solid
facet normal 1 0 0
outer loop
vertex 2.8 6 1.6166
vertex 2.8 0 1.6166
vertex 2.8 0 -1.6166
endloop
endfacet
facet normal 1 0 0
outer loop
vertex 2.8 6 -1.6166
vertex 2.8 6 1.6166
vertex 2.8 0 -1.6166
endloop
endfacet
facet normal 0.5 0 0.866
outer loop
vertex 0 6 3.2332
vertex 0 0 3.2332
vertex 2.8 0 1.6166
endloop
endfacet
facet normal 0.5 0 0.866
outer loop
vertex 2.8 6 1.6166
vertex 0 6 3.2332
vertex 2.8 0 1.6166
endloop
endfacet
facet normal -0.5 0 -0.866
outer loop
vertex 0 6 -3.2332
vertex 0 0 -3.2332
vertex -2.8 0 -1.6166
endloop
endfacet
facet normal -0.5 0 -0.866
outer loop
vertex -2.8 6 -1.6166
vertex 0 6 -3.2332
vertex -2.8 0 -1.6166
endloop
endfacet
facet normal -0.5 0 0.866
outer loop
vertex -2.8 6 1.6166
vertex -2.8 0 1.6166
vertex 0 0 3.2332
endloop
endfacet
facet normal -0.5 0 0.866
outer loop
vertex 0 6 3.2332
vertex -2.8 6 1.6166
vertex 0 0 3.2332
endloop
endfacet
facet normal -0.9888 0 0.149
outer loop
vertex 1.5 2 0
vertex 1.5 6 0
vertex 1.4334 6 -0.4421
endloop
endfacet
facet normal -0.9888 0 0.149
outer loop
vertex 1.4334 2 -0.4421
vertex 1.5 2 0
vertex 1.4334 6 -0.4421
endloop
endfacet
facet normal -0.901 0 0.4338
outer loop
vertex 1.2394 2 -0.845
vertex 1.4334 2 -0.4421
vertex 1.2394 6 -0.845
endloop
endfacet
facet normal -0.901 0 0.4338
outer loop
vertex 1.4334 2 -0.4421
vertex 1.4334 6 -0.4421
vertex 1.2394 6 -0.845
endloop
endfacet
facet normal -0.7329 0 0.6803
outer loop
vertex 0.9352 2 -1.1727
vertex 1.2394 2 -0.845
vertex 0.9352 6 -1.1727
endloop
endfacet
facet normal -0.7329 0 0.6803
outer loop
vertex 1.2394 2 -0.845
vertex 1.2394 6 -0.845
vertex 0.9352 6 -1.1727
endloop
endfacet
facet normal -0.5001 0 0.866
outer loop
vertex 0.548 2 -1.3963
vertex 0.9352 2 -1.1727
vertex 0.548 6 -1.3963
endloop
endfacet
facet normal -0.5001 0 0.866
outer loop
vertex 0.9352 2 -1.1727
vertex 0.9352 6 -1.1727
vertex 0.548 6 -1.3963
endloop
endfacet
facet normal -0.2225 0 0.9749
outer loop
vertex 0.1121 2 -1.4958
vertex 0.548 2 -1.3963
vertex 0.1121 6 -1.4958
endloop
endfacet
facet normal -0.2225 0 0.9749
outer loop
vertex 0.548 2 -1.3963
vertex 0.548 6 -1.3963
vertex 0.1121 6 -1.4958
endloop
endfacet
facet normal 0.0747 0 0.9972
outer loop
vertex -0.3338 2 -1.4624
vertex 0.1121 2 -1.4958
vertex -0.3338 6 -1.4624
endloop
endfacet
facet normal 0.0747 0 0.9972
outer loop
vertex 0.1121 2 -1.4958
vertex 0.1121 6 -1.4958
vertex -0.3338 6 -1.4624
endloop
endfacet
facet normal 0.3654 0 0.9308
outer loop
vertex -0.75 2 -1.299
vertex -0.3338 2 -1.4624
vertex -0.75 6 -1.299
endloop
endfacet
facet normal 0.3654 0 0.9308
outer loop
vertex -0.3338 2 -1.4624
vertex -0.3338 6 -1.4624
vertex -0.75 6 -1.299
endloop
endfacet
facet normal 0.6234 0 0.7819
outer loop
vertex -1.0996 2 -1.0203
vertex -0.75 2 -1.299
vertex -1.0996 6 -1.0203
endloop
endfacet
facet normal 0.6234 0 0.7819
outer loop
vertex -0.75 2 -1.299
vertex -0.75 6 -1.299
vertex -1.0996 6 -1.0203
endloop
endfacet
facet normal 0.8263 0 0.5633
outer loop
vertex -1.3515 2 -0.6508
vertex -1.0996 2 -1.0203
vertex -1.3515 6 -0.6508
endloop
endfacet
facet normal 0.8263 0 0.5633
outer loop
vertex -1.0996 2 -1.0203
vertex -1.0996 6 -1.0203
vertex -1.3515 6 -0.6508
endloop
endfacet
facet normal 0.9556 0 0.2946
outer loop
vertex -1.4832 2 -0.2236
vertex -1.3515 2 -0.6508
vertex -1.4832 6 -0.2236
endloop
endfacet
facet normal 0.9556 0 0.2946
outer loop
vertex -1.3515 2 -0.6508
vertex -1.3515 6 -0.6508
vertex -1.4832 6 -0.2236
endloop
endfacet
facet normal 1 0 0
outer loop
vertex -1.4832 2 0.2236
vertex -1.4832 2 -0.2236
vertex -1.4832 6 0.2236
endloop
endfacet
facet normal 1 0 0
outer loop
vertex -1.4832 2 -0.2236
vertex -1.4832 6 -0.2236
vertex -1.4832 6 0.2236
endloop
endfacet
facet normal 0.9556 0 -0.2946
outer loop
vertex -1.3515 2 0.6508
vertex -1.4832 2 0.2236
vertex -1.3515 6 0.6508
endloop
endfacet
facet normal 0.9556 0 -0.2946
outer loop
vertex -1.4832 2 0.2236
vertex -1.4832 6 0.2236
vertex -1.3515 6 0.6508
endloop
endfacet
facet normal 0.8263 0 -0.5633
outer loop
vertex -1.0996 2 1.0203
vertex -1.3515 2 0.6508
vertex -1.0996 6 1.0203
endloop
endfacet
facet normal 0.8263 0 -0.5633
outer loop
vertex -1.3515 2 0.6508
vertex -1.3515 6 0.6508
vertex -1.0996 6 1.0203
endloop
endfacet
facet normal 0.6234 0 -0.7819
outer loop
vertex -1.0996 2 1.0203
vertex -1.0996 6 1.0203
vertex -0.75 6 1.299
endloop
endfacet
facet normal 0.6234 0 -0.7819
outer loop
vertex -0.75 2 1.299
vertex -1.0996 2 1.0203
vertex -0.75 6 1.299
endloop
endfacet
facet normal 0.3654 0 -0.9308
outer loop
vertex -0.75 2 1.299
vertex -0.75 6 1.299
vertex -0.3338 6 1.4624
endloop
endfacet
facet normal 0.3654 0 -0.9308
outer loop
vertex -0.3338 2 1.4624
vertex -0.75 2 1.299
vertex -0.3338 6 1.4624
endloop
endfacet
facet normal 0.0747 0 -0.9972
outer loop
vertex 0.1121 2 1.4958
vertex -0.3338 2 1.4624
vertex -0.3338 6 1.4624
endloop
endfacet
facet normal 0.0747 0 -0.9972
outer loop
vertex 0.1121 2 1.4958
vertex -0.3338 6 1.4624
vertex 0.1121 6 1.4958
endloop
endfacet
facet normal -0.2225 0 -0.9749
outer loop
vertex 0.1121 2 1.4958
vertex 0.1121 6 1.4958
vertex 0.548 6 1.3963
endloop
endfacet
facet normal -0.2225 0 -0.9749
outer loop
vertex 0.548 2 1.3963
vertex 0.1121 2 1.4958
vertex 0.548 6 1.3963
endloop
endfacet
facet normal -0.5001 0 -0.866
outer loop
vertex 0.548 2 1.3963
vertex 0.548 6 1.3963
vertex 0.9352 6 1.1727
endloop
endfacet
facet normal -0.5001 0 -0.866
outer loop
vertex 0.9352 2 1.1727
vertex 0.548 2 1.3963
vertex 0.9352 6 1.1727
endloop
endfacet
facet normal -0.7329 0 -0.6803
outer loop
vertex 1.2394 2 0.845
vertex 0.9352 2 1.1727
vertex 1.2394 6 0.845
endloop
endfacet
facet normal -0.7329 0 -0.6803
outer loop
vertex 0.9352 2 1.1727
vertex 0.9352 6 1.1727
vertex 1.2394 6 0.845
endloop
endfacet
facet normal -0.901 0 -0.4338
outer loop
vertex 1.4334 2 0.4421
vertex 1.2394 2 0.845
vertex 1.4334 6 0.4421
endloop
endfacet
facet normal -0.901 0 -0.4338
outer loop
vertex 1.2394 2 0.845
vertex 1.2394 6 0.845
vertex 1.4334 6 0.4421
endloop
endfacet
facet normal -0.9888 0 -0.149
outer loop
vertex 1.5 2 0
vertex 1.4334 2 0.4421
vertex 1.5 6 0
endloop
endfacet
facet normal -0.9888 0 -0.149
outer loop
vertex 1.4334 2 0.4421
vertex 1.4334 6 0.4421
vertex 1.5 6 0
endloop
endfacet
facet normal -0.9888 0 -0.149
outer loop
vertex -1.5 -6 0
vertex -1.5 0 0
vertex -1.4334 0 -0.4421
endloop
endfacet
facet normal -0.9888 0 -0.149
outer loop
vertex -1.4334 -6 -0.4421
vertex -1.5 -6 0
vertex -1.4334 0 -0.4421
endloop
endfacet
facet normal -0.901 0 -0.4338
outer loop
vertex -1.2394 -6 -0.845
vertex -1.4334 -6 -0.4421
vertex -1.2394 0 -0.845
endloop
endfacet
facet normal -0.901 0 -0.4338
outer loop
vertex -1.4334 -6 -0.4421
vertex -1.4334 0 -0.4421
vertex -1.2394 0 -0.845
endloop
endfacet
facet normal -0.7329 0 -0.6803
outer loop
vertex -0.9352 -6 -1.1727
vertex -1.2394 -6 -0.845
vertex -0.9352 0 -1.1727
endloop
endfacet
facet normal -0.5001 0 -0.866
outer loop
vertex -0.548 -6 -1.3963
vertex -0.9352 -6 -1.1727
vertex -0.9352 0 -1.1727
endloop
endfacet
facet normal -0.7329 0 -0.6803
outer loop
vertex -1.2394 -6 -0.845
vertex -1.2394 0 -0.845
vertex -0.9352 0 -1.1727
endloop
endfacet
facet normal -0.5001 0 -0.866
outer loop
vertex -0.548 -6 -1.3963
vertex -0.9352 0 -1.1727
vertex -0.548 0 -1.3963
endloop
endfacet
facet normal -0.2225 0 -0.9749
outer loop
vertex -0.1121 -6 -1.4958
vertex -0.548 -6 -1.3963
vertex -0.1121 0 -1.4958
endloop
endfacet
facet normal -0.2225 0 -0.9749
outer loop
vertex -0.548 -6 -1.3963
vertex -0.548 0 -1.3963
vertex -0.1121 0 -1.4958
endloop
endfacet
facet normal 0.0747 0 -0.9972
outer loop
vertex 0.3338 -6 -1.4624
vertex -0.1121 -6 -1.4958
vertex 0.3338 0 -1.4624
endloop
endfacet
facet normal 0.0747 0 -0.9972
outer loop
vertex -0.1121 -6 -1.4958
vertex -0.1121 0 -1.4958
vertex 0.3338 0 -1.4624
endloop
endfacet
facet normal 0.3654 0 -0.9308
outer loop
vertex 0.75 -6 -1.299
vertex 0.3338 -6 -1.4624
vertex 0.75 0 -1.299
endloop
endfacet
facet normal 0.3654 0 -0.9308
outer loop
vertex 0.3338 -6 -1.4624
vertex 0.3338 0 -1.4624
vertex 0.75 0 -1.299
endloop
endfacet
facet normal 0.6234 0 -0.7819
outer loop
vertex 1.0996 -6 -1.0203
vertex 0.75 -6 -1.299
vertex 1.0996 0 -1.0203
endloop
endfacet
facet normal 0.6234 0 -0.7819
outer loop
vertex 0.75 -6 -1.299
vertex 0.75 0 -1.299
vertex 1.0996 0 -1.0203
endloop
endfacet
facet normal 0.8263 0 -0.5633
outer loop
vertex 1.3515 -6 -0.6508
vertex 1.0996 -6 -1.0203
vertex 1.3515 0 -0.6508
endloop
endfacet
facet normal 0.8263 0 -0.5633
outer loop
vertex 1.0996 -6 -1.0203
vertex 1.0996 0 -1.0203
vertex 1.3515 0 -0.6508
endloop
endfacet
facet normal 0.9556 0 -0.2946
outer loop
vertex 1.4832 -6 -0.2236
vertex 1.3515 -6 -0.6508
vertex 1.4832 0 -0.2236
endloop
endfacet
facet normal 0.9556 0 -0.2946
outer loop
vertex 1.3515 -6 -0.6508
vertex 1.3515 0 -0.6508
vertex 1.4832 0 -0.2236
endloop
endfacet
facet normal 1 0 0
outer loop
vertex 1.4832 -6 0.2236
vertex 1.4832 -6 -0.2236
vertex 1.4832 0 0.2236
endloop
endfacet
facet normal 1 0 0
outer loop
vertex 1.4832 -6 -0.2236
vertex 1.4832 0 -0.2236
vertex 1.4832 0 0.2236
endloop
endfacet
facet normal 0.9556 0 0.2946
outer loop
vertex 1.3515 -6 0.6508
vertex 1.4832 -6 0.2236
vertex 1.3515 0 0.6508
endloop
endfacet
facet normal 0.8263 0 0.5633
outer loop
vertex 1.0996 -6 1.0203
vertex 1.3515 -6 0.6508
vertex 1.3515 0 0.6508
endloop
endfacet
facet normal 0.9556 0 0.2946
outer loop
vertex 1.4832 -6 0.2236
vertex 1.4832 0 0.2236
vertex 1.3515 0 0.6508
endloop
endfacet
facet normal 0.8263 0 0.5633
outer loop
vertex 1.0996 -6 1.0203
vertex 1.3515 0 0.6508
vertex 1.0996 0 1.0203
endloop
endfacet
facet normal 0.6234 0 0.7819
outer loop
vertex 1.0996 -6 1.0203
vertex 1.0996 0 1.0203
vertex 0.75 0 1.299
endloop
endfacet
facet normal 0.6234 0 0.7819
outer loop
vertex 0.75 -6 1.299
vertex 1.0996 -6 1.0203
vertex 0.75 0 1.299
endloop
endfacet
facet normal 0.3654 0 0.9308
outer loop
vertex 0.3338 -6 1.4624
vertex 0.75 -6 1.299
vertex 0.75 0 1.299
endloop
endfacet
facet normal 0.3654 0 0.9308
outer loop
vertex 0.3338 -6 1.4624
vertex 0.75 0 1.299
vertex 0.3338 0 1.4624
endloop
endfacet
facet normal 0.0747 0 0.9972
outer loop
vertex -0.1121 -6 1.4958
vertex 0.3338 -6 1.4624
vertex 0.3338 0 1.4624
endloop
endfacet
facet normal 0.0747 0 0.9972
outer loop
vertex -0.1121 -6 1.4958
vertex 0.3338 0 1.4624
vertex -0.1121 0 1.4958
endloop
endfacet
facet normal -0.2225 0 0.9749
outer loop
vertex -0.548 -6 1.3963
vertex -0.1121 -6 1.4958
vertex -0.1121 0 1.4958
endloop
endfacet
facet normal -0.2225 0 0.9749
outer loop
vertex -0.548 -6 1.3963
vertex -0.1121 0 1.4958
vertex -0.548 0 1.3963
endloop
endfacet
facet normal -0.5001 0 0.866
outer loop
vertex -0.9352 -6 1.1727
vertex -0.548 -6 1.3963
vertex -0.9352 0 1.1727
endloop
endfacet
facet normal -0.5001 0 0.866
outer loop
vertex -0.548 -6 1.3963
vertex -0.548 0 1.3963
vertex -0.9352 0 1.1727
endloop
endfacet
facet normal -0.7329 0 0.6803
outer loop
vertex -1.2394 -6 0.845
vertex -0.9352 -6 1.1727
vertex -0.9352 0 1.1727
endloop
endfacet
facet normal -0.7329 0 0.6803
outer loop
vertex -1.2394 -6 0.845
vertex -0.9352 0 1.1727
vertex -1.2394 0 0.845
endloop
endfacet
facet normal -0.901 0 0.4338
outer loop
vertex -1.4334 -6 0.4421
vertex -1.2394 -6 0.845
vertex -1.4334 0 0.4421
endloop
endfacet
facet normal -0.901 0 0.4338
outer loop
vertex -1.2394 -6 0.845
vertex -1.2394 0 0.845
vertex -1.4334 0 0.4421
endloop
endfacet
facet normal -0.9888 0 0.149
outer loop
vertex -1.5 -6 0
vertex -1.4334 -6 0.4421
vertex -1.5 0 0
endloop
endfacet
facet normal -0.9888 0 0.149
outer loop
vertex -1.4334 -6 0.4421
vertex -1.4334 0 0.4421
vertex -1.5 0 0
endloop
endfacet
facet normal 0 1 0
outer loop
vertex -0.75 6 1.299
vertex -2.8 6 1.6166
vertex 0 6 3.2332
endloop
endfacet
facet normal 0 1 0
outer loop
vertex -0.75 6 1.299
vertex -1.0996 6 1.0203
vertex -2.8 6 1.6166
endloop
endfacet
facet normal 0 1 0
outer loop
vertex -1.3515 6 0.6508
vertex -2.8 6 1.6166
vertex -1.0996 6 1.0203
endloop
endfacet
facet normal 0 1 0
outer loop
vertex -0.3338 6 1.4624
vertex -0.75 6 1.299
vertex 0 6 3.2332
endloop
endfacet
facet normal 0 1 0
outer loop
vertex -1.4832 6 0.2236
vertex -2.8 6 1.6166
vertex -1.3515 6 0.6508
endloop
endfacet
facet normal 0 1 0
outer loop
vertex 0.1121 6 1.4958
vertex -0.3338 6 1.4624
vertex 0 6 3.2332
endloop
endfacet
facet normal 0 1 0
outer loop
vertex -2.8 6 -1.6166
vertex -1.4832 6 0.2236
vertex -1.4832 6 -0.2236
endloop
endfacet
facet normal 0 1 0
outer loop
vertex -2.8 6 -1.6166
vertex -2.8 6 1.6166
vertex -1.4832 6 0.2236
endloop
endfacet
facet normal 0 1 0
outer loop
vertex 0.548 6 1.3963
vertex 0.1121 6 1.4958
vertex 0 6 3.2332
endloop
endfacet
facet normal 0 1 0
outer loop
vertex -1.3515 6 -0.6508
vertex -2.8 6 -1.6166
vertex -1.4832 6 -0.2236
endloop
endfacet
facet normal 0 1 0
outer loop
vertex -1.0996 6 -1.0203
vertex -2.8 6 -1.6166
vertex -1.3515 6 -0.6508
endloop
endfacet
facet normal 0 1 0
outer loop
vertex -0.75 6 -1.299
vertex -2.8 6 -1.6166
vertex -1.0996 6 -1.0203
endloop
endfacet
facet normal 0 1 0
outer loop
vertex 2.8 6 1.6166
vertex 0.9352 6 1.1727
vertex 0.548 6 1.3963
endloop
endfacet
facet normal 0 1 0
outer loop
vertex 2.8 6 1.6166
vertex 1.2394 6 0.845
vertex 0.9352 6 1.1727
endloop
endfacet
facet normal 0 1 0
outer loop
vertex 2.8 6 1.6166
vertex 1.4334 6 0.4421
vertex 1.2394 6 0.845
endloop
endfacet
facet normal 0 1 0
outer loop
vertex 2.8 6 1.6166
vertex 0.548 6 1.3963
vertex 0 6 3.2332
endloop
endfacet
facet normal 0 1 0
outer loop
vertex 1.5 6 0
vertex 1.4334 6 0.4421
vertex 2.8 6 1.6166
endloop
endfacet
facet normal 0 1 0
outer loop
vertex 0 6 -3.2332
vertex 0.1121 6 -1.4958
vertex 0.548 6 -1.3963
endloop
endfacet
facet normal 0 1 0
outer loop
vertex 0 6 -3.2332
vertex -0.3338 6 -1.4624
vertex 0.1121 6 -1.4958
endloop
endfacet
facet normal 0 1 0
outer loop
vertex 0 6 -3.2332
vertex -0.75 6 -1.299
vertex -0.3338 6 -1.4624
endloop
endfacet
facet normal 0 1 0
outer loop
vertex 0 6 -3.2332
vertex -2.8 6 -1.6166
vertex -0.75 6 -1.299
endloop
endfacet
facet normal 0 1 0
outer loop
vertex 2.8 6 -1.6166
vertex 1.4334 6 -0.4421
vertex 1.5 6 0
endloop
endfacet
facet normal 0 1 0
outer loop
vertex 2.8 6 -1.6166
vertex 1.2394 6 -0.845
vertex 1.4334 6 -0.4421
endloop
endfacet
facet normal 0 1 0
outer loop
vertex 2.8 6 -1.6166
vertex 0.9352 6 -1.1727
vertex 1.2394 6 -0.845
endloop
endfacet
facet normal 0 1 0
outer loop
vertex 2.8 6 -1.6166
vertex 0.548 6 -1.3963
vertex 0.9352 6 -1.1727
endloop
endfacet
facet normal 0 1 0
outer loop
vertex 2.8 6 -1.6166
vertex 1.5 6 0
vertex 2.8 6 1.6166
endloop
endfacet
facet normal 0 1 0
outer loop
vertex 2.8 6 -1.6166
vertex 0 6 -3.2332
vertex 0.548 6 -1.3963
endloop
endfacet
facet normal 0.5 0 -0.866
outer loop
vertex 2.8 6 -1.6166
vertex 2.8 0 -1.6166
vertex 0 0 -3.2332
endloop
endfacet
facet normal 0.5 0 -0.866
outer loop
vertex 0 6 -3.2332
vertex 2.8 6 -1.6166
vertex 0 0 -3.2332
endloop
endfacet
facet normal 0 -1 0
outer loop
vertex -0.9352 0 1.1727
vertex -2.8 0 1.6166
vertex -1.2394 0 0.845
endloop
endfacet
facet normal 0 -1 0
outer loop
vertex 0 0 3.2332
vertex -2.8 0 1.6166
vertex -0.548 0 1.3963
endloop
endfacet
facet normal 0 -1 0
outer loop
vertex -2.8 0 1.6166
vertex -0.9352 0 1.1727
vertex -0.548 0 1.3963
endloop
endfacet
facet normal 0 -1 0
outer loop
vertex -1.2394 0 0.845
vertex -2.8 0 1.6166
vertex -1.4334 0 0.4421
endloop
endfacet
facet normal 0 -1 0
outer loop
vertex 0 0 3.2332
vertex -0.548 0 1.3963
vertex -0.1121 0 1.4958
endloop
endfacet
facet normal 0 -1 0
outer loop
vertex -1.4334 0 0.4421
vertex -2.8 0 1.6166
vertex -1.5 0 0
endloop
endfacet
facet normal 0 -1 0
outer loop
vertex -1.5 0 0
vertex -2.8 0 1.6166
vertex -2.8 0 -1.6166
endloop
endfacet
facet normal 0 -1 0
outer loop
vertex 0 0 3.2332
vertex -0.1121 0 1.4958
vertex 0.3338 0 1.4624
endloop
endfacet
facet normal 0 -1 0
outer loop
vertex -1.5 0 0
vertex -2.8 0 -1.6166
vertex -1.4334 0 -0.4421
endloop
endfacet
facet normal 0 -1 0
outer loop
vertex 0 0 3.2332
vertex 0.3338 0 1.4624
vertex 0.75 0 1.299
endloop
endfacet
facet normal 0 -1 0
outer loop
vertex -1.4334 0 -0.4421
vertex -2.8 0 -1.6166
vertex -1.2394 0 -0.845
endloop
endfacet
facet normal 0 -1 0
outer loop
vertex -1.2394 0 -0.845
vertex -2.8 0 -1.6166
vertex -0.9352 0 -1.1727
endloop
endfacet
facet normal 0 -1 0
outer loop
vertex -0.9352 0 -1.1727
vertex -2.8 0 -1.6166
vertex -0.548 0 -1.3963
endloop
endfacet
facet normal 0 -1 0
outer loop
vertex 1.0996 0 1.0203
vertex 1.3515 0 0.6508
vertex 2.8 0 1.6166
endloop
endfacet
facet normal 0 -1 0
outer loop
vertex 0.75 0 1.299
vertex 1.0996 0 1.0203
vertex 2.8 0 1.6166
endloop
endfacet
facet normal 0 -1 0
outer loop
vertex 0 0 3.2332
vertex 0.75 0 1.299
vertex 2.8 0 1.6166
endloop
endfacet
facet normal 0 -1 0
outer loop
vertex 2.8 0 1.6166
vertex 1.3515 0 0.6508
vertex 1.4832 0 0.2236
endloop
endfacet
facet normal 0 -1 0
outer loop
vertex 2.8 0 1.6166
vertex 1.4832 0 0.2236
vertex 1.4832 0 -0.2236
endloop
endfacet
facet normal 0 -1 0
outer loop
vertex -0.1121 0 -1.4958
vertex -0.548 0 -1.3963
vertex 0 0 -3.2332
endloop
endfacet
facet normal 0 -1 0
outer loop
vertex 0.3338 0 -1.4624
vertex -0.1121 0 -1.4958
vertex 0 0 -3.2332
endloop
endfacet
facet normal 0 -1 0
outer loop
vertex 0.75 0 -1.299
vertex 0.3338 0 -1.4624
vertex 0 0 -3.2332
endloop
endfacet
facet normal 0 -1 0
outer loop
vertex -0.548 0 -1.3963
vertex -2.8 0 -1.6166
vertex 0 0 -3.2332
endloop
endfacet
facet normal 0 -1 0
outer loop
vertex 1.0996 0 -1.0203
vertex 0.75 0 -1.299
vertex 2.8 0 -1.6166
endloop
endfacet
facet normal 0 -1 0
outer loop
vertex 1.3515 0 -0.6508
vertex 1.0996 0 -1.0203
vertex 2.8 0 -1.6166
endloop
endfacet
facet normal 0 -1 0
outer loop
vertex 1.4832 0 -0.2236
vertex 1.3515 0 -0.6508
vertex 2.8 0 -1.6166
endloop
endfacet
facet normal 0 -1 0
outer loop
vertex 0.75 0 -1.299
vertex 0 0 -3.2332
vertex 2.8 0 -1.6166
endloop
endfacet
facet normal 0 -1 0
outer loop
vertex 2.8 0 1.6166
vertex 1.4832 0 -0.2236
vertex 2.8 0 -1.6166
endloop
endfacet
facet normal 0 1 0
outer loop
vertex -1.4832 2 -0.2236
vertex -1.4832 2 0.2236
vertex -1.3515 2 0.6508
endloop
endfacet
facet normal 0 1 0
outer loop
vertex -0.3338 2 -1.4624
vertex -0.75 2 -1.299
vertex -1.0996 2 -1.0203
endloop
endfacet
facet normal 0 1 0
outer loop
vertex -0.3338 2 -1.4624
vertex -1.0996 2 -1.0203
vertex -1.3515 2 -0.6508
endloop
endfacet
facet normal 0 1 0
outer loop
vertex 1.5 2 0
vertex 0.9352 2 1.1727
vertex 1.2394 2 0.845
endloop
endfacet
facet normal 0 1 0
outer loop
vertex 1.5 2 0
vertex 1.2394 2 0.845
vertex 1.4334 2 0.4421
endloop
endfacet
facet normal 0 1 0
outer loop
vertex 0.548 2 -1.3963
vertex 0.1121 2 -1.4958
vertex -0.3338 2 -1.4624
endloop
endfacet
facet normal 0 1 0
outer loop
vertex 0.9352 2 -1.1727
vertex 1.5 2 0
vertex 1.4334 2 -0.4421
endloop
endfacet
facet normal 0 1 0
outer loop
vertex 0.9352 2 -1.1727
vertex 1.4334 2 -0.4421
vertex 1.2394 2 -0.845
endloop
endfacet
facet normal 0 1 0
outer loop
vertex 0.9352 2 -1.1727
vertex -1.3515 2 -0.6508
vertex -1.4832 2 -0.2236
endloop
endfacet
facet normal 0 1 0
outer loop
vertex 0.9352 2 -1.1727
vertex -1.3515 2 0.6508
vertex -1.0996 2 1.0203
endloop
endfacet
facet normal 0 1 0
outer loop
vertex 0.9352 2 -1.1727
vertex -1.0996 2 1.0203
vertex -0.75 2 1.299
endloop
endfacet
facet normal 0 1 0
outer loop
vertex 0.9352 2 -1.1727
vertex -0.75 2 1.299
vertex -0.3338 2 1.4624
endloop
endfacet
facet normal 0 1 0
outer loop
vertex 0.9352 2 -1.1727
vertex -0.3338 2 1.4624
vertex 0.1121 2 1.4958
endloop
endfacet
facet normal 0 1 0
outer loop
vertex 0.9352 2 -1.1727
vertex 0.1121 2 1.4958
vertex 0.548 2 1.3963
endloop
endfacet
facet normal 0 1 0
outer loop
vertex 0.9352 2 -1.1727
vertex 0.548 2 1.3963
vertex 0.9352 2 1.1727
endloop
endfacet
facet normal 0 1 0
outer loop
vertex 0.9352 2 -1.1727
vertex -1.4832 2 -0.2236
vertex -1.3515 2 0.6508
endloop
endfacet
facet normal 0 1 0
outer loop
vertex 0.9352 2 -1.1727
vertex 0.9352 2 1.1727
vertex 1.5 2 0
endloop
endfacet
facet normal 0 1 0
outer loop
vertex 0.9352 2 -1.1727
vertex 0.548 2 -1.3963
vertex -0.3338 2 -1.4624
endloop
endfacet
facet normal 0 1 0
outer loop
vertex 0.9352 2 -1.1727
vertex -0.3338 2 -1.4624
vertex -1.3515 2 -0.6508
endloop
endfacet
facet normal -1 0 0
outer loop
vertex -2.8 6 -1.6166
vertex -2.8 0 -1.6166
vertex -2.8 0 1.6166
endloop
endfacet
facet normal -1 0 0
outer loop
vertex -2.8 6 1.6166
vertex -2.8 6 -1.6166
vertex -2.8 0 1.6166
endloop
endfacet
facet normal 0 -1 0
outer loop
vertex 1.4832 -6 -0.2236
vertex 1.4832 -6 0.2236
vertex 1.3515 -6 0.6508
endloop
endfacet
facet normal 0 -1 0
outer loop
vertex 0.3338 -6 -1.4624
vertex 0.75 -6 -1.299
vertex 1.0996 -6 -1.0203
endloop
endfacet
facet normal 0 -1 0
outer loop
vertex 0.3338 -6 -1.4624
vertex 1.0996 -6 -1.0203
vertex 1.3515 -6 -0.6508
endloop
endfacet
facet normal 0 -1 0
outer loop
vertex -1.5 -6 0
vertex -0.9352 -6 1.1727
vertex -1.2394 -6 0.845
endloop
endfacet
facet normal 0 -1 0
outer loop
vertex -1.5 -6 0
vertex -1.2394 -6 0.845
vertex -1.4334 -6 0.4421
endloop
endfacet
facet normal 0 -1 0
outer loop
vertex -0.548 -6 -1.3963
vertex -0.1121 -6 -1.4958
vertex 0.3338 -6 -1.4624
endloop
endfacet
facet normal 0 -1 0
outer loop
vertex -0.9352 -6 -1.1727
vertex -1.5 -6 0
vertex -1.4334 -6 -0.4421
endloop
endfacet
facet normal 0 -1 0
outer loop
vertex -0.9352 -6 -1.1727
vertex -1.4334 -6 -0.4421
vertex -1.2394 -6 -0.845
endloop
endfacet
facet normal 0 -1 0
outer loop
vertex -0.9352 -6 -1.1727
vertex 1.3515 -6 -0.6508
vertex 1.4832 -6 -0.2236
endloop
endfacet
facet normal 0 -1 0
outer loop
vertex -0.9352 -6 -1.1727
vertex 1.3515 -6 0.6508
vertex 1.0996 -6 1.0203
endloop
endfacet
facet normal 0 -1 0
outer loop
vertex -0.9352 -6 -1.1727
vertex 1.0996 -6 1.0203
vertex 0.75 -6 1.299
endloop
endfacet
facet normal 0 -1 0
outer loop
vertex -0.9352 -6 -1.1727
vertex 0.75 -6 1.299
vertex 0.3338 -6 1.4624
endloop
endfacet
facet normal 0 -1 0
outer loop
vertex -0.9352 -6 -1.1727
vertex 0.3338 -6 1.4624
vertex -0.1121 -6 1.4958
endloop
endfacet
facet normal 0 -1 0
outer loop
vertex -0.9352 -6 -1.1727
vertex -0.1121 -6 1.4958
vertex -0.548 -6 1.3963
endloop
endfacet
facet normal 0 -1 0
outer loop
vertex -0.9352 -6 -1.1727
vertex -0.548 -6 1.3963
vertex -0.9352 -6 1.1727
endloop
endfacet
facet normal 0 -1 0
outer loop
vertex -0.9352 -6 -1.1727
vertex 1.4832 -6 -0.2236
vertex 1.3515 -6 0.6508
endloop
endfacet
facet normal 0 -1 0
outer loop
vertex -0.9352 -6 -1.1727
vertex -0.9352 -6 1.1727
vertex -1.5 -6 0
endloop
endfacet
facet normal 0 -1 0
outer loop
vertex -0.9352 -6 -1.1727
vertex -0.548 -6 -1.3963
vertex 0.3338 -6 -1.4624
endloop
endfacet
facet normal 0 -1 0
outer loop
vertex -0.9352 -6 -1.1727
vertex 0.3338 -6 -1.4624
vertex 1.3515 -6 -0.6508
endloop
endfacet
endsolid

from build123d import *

# Parameters (mm, degrees)
BOSS_EXTRUDE1_DEPTH = 6
SKETCH2_R           = 1.5
BOSS_EXTRUDE2_DEPTH = 6
SKETCH3_R           = 1.5
CUT_EXTRUDE1_DEPTH  = 4


with BuildPart() as part:
    # Sketch1 → Boss-Extrude1 (new body)
    with BuildSketch(Plane(origin=(0, 0, 0), x_dir=(1, 0, 0), z_dir=(0, 1, 0))):
        Polygon((0, -3.233161507), (2.8, -1.616580754), (2.8, 1.616580754), (0, 3.233161507), (-2.8, 1.616580754), (-2.8, -1.616580754), align=None)
    extrude(amount=BOSS_EXTRUDE1_DEPTH)

    # Sketch2 → Boss-Extrude2 (add)
    with BuildSketch(Plane(origin=(0, 0, 0), x_dir=(-1, 0, 0), z_dir=(0, -1, 0))):
        Circle(SKETCH2_R)
    extrude(amount=BOSS_EXTRUDE2_DEPTH)

    # Sketch3 → Cut-Extrude1 (cut)
    with BuildSketch(Plane(origin=(0, 6, 0), x_dir=(1, 0, 0), z_dir=(0, 1, 0))):
        Circle(SKETCH3_R)
    extrude(amount=-CUT_EXTRUDE1_DEPTH, mode=Mode.SUBTRACT)


solid = part.part
